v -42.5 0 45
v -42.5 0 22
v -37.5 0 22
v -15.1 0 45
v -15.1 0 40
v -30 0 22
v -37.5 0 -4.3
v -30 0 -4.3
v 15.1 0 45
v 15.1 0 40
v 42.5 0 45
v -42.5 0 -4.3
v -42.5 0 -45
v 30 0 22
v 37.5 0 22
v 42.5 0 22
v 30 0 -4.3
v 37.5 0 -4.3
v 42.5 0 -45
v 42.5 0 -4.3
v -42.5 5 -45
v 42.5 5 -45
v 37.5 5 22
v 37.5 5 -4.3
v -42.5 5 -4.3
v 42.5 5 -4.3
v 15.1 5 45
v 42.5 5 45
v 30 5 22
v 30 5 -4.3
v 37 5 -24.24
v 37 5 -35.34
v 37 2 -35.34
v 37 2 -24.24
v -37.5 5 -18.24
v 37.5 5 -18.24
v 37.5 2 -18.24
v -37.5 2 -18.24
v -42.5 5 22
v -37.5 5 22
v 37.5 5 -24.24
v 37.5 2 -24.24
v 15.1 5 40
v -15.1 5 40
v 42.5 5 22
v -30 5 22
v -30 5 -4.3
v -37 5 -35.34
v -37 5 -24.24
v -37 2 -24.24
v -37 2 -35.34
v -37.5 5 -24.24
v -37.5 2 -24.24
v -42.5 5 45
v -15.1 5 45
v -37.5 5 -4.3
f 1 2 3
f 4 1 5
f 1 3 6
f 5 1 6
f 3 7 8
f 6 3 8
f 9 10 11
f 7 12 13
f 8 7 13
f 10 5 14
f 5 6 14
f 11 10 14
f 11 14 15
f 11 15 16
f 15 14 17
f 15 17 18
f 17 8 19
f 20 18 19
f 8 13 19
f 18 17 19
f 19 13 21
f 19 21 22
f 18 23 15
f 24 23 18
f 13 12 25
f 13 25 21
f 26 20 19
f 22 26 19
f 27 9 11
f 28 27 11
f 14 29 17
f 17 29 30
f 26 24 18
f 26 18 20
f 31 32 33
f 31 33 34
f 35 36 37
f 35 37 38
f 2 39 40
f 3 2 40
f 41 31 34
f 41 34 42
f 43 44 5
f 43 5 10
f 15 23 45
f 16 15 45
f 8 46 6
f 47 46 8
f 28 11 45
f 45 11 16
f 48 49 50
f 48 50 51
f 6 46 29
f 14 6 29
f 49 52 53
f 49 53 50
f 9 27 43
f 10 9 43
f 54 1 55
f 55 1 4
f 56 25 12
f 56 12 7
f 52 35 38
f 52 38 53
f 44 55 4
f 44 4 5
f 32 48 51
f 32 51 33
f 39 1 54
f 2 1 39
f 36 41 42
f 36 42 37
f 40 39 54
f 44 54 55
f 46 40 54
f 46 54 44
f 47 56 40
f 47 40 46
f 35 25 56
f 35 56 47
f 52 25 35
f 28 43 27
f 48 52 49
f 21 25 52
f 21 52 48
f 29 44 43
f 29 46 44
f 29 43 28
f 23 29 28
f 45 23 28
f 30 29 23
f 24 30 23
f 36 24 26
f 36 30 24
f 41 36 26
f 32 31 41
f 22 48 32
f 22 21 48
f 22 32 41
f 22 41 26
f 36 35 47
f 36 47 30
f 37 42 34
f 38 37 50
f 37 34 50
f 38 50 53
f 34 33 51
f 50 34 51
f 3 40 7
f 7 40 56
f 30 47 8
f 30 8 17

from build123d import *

# Parameters (mm, degrees)
SKETCH1_W           = 85
SKETCH1_H           = 90
BOSS_EXTRUDE1_DEPTH = 5
SKETCH2_W           = 60
SKETCH2_H           = 26.3
CUT_EXTRUDE2_DEPTH  = 7.5
SKETCH4_W           = 5
SKETCH4_H           = 26.3
CUT_EXTRUDE3_DEPTH  = 7.5
SKETCH5_W           = 30.2
SKETCH5_H           = 5
CUT_EXTRUDE4_DEPTH  = 5
CUT_EXTRUDE5_DEPTH  = 3


with BuildPart() as part:
    # Sketch1 → Boss-Extrude1 (new body)
    with BuildSketch(Plane(origin=(0, 0, 0), x_dir=(1, 0, 0), z_dir=(0, 1, 0))):
        Rectangle(SKETCH1_W, SKETCH1_H)
    extrude(amount=BOSS_EXTRUDE1_DEPTH)

    # Sketch2 → Cut-Extrude2 (cut)
    with BuildSketch(Plane(origin=(0, 5, 0), x_dir=(1, 0, 0), z_dir=(0, 1, 0))):
        with Locations((0, -8.85)):
            Rectangle(SKETCH2_W, SKETCH2_H)
    extrude(amount=-CUT_EXTRUDE2_DEPTH, mode=Mode.SUBTRACT)

    # Sketch4 → Cut-Extrude3 (cut)
    with BuildSketch(Plane(origin=(0, 5, 0), x_dir=(1, 0, 0), z_dir=(0, 1, 0))):
        with Locations((-40, -8.85)):
            Rectangle(SKETCH4_W, SKETCH4_H)
        with Locations((40, -8.85)):
            Rectangle(SKETCH4_W, SKETCH4_H)
    extrude(amount=-CUT_EXTRUDE3_DEPTH, mode=Mode.SUBTRACT)

    # Sketch5 → Cut-Extrude4 (cut)
    with BuildSketch(Plane(origin=(0, 5, 0), x_dir=(1, 0, 0), z_dir=(0, 1, 0))):
        with Locations((0, -42.5)):
            Rectangle(SKETCH5_W, SKETCH5_H)
    extrude(amount=-CUT_EXTRUDE4_DEPTH, mode=Mode.SUBTRACT)

    # Sketch6 → Cut-Extrude5 (cut)
    with BuildSketch(Plane(origin=(0, 5, 0), x_dir=(1, 0, 0), z_dir=(0, 1, 0))):
        Polygon((-37, 35.34), (37, 35.34), (37, 24.24), (37.5, 24.24), (37.5, 18.24), (-37.5, 18.24), (-37.5, 24.24), (-37, 24.24), align=None)
    extrude(amount=-CUT_EXTRUDE5_DEPTH, mode=Mode.SUBTRACT)


solid = part.part
